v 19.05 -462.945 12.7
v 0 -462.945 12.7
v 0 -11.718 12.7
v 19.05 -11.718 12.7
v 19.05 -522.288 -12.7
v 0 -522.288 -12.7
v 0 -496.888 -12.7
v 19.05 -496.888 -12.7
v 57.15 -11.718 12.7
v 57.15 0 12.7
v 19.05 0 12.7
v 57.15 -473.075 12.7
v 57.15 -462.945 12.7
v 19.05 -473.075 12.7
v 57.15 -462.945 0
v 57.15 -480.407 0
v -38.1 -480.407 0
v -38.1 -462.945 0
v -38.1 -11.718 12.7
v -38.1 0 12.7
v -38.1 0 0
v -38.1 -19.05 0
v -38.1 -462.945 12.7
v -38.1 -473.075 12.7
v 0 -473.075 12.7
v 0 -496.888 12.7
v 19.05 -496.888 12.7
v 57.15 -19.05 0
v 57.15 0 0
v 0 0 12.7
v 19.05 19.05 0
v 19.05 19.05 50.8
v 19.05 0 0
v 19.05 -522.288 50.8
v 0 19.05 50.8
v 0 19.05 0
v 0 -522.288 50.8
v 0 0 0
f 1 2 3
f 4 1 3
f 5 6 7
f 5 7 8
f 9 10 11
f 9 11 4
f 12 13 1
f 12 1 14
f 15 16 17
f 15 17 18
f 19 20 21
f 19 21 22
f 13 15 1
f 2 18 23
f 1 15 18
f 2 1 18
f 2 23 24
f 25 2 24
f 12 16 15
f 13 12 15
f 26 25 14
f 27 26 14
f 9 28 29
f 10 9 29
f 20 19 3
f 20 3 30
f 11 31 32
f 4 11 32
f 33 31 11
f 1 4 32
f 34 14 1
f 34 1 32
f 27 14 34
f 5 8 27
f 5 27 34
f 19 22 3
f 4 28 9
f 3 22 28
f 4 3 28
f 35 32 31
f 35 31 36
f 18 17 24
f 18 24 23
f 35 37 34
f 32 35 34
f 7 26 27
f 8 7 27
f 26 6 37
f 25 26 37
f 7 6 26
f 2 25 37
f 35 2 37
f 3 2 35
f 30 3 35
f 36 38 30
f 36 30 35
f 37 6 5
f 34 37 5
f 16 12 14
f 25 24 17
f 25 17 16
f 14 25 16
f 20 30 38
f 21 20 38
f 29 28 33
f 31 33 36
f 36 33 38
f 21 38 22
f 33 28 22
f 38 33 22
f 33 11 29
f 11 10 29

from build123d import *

# Parameters (mm, degrees)
F1_DEPTH  = 19.05
F3_DEPTH  = 38.1
F5_DEPTH  = 38.1
F7_DEPTH  = 19.05
F9_DEPTH  = 57.15
F10_DEPTH = 38.1
F11_W     = 19.05
F11_H     = 38.1
F12_DEPTH = 25.4
F13_W     = 19.05
F13_H     = 19.05
F13_H_2   = 6.35
F14_DEPTH = 25.4
F15_DEPTH = 38.1


# Not quite as in the source:
# - a feature names something its author has since deleted; it is built from what else it names


with BuildPart() as f1:
    # F0 (on Right) → F1 (new body)
    with BuildSketch(Plane.YZ):
        Polygon((-19.05, 0), (0, 0), (0, 50.8), (-477.8375, 50.8), (-477.8375, 12.7), (-11.7176515813, 12.7), align=None)
    extrude(amount=F1_DEPTH)

    # F2 (on face) → F3 (join)
    with BuildSketch(Plane.YZ.offset(19.05)):
        Polygon((0, 12.7), (-11.7176515813, 12.7), (-19.05, 0), (0, 0), align=None)
    extrude(amount=F3_DEPTH)

    # F4 (on face) → F5 (join)
    with BuildSketch(Plane(origin=(0, 0, 0), x_dir=(0, -1, 0), z_dir=(-1, 0, 0))):
        Polygon((19.05, 0), (11.7176515813, 12.7), (0, 12.7), (0, 0), align=None)
    extrude(amount=F5_DEPTH)

    # F6 (on face) → F7 (join)
    with BuildSketch(Plane(origin=(0, 0, 0), x_dir=(-1, 0, 0), z_dir=(0, 1, 0))):
        Polygon((0, 50.8), (-19.05, 50.8), (-19.05, 12.7), (-19.05, 0), (0, 0), (0, 12.7), align=None)
    extrude(amount=F7_DEPTH)

    # F8 (on face) → F9 (join)
    with BuildSketch(Plane.YZ.offset(19.05)):
        Polygon((-462.9448484187, 12.7), (-473.075, 12.7), (-480.4073484187, 0), (-462.9448484187, 0), align=None)
    extrude(amount=-F9_DEPTH)

    # F8 (on face) → F10 (join)
    with BuildSketch(Plane.YZ.offset(19.05)):
        Polygon((-462.9448484187, 12.7), (-473.075, 12.7), (-480.4073484187, 0), (-462.9448484187, 0), align=None)
    extrude(amount=F10_DEPTH)

    # F11 (on face) → F12 (join)
    with BuildSketch(Plane.XZ.offset(477.8375)):
        with Locations((9.525, 31.75)):
            Rectangle(F11_W, F11_H)
    extrude(amount=F12_DEPTH)

    # F13 (on face) → F14 (join)
    with BuildSketch(Plane(origin=(0, 0, 12.7), x_dir=(1, 0, 0), z_dir=(0, 0, -1))):
        with Locations((9.525, 512.7625)):
            Rectangle(F13_W, F13_H)
        with Locations((9.525, 500.0625)):
            Rectangle(F13_W, F13_H_2)
    extrude(amount=F14_DEPTH)

    # F15 (add, through all): a face of the model
    f15_faces = [f1.faces().sort_by_distance(p)[0] for p in [
        (9.525, -512.7625, 12.7),
    ]]
    extrude(f15_faces, amount=F15_DEPTH)


solid = f1.part
